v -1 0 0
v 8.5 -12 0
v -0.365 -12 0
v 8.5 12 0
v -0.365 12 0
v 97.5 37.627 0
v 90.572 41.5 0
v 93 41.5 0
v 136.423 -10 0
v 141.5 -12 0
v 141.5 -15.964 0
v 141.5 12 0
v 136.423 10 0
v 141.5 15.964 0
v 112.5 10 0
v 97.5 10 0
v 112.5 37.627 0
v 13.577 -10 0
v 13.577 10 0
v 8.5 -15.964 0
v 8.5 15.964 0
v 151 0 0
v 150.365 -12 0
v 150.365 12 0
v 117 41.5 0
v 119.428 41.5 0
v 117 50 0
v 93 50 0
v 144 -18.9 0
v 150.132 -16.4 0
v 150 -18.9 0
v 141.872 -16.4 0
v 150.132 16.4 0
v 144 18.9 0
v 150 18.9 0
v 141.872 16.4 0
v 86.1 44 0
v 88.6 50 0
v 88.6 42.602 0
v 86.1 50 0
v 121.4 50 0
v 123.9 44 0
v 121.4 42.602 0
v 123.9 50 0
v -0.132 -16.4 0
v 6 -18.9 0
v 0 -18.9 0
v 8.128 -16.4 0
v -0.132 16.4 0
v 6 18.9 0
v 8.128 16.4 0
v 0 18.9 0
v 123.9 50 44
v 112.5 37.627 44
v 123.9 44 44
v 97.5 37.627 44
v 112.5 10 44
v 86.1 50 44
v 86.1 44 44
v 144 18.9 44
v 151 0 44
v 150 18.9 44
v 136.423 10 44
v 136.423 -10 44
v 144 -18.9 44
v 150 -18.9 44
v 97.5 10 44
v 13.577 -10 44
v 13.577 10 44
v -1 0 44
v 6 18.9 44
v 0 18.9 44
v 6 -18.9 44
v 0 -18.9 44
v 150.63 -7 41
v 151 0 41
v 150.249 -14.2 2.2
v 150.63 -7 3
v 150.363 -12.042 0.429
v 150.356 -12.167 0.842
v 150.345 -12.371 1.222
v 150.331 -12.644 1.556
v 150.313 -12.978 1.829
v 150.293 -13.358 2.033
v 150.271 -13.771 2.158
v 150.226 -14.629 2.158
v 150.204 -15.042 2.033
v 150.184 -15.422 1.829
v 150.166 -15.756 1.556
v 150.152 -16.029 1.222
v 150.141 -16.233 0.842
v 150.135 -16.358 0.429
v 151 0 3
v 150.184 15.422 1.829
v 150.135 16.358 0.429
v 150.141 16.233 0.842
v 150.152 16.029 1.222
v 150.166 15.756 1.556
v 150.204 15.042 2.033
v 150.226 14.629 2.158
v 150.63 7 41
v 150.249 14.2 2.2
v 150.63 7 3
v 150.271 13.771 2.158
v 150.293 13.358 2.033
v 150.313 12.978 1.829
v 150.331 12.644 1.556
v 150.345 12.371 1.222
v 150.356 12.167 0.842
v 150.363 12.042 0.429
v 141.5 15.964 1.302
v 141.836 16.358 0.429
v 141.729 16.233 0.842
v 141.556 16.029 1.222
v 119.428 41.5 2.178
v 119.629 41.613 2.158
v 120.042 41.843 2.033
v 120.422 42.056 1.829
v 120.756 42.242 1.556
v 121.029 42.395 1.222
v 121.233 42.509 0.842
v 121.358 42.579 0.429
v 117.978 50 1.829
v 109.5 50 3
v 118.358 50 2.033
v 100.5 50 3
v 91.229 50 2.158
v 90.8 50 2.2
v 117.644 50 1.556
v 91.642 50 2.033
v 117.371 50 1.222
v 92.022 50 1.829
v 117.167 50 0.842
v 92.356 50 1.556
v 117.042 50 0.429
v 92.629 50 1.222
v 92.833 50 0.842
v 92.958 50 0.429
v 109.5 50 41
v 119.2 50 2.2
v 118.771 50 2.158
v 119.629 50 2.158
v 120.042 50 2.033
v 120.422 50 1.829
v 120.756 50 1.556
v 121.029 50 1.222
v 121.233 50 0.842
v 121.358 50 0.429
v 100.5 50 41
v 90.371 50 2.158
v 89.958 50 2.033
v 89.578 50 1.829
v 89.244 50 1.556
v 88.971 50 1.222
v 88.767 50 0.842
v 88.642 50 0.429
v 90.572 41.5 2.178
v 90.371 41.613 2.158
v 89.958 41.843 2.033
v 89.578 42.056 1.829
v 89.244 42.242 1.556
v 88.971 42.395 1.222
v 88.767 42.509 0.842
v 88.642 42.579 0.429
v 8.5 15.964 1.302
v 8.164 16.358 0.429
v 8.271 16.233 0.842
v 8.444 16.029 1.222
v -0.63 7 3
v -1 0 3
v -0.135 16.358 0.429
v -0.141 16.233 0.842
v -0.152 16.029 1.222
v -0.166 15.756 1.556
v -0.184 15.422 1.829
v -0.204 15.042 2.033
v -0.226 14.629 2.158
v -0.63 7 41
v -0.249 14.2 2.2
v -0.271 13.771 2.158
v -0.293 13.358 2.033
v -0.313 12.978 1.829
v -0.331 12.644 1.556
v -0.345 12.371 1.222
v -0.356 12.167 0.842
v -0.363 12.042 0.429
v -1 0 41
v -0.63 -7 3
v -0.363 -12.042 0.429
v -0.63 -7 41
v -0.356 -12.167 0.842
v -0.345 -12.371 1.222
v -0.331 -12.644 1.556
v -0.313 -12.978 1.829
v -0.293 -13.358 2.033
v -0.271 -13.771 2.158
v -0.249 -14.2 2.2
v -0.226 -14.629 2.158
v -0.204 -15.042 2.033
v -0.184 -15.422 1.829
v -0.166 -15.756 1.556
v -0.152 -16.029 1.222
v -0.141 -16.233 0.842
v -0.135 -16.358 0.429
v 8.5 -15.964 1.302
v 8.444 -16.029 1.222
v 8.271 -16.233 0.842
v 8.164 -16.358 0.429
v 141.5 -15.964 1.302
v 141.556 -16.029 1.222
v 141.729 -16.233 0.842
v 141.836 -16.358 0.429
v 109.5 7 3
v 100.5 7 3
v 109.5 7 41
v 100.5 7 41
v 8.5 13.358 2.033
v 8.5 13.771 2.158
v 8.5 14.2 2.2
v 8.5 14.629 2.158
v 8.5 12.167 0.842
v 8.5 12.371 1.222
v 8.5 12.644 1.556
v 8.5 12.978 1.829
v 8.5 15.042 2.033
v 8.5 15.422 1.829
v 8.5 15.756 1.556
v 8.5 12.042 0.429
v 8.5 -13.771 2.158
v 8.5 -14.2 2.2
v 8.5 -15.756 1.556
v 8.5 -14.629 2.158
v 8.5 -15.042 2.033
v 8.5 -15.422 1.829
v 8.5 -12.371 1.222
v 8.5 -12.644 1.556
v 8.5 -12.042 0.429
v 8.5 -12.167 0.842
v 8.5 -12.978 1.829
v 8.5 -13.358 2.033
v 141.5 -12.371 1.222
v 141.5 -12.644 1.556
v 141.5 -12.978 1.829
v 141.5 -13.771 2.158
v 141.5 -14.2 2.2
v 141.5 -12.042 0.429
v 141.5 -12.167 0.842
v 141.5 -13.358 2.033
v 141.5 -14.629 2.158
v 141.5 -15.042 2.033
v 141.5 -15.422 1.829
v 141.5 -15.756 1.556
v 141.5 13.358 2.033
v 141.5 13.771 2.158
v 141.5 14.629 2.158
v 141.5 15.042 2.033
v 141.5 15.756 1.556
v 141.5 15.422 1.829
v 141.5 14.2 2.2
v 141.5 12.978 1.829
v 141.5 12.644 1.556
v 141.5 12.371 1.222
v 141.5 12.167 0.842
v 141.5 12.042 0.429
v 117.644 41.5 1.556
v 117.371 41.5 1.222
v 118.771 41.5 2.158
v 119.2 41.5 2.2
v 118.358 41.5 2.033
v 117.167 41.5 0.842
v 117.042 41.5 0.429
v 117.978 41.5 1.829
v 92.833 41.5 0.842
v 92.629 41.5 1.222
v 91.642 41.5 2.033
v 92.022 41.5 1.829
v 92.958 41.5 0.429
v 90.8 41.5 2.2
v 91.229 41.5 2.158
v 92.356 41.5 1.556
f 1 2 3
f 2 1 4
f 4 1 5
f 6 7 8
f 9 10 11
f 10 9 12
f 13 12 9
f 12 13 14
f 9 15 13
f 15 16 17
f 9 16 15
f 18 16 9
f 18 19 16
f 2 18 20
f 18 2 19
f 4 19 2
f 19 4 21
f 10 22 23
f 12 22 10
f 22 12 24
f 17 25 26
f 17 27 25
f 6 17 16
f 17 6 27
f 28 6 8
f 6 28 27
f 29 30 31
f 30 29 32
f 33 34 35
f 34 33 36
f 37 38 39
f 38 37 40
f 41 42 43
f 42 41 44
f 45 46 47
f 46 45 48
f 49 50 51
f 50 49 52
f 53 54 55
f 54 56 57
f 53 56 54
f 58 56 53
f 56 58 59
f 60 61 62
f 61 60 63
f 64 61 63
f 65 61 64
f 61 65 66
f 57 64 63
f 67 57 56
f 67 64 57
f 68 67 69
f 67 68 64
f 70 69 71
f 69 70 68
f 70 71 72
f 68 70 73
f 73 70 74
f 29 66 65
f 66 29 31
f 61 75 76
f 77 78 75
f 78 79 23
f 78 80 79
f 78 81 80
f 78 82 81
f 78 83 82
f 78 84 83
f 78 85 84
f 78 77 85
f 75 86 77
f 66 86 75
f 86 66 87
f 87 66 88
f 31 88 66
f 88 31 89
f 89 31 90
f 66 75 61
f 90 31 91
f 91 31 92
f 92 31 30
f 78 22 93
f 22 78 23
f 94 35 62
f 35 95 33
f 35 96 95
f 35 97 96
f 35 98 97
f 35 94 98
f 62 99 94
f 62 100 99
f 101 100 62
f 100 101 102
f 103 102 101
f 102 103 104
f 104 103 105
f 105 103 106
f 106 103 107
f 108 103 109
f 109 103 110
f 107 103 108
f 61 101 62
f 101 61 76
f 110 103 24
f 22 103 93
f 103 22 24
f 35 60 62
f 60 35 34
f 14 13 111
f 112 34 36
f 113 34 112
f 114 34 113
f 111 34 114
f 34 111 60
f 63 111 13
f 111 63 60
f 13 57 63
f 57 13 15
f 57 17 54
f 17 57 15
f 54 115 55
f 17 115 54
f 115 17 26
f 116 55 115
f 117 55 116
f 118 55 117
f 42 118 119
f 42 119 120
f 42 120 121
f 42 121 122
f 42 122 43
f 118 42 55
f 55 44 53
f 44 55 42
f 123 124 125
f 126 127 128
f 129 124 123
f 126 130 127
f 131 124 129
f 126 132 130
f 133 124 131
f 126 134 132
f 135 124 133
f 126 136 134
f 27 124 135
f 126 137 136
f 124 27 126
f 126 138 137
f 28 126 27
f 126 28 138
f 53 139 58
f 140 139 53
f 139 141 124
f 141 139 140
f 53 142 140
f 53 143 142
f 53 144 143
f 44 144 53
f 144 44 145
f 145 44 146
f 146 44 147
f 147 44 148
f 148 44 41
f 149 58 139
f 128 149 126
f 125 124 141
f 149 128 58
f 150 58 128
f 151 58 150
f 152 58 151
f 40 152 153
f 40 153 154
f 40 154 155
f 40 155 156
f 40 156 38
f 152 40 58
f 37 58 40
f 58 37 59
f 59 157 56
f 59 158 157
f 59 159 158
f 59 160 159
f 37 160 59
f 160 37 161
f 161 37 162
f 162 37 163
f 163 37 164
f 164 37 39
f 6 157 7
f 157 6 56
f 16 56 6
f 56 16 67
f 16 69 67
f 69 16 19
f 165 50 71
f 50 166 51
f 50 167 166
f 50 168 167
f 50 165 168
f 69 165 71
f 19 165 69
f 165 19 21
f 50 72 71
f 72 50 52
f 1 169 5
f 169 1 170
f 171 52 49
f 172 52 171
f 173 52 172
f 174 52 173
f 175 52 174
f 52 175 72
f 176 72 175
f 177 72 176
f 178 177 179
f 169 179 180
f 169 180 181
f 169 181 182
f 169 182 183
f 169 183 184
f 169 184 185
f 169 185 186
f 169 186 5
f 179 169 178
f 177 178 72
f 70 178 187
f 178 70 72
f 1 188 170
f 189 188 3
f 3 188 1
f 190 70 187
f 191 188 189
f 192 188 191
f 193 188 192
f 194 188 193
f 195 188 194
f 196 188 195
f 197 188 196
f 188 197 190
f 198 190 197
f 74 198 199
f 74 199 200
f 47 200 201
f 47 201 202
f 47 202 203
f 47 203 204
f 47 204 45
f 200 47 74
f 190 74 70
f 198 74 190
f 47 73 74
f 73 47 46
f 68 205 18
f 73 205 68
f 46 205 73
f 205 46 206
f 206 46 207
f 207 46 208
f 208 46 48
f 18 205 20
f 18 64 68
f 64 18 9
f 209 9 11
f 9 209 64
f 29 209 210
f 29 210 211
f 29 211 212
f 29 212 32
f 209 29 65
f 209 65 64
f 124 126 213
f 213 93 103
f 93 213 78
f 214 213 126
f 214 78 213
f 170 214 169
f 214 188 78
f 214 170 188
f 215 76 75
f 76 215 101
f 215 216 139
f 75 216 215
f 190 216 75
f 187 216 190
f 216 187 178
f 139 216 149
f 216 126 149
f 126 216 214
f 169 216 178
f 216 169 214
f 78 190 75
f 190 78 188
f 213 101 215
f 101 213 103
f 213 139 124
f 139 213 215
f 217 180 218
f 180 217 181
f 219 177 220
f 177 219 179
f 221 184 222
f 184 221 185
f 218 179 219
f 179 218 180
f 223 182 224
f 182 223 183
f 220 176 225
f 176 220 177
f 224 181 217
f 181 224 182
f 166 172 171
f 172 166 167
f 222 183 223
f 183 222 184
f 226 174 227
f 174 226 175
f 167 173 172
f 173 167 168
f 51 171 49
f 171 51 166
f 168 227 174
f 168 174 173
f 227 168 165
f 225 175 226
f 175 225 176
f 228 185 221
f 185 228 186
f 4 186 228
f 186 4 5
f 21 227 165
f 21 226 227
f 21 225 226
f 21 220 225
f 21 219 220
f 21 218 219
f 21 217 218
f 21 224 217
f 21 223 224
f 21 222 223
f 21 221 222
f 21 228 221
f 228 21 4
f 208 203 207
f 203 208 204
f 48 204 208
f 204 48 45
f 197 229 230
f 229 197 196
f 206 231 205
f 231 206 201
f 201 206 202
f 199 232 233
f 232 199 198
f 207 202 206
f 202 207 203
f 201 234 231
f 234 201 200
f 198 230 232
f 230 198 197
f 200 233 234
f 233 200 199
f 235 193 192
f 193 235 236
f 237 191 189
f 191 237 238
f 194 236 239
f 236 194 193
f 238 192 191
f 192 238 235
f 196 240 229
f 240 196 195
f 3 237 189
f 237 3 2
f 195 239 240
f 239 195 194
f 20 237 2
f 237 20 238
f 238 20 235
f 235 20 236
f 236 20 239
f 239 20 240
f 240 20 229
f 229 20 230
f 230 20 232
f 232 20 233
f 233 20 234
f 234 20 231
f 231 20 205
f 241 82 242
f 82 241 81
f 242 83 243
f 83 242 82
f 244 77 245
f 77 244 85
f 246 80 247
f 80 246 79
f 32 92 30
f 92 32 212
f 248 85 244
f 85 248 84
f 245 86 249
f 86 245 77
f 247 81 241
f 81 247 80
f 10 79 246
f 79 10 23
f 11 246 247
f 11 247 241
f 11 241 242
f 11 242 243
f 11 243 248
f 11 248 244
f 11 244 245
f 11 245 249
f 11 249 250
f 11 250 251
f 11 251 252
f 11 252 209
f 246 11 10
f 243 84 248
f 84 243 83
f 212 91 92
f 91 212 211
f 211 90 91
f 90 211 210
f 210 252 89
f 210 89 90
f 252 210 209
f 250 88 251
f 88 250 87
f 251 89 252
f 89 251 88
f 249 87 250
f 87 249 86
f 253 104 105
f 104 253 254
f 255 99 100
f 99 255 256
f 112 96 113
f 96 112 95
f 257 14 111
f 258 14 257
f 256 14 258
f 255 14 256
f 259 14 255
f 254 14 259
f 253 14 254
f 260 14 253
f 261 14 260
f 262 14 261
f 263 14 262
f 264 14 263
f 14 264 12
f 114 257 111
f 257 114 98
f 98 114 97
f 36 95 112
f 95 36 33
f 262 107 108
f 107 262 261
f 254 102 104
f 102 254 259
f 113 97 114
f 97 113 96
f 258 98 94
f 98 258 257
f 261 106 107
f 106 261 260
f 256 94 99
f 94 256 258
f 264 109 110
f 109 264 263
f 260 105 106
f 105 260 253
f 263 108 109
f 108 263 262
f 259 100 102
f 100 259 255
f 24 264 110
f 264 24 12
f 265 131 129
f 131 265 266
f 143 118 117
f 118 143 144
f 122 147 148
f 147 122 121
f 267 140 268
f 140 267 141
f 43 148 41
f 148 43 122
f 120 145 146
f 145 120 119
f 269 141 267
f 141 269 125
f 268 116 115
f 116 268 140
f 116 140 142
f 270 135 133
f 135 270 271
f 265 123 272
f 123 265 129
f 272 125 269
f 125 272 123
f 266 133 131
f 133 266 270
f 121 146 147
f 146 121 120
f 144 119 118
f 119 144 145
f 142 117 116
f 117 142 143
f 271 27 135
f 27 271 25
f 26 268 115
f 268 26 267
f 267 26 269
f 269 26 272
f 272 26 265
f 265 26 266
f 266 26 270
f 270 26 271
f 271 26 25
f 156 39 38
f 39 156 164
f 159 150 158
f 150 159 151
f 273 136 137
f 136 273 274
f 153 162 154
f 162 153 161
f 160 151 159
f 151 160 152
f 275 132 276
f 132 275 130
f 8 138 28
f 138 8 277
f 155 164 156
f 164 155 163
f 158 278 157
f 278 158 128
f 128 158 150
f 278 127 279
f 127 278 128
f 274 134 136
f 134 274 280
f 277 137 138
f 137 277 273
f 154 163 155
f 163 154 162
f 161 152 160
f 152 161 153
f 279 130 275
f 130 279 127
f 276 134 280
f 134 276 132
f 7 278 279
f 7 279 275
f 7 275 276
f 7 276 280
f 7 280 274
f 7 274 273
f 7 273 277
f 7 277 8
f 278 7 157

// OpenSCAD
$fn = 32;

// ----------------------------------------------------------------------
// Air duct: 20 mm duct, 3 mm wall, 44 mm across
// ----------------------------------------------------------------------

// --- parameters (mm) ---
duct_r = 10;              // duct core radius
duct_d = 20;              // duct core diameter
wall = 3;                 // duct wall thickness
height = 44;              // duct width (extrusion height)
port_r = 18.9;            // port flange half width
port_d = 37.8;            // port flange width
port_t = 6;               // port flange thickness
bolt_d = 4.4;             // port bolt holes
bolt_offset = 14.2;       // bolt hole offset from the port axis
branch_r = 7.5;           // branch core radius
branch_d = 15;            // branch core diameter
branch_len = 50;          // branch length from the run axis

difference() {
  /* outer hull chain: tube with a flat flange plate at every port */
  linear_extrude(height = 44) {
    hull() {
      polygon([[0, -18.9], [0, 18.9], [6, 18.9], [6, -18.9]]);
      translate([9, 0]) circle(r = 10);
    }
    hull() {
      translate([9, 0]) circle(r = 10);
      translate([45, 0]) circle(r = 10);
    }
    hull() {
      translate([45, 0]) circle(r = 10);
      translate([105, 0]) circle(r = 10);
    }
    hull() {
      translate([105, 0]) circle(r = 10);
      translate([141, 0]) circle(r = 10);
    }
    hull() {
      translate([141, 0]) circle(r = 10);
      polygon([[150, 18.9], [150, -18.9], [144, -18.9], [144, 18.9]]);
    }
    hull() {
      translate([105, 0]) circle(r = 7.5);
      translate([105, 27.5]) circle(r = 7.5);
    }
    hull() {
      translate([105, 27.5]) circle(r = 7.5);
      translate([105, 42]) circle(r = 7.5);
    }
    hull() {
      translate([105, 42]) circle(r = 7.5);
      polygon([[86.1, 50], [123.9, 50], [123.9, 44], [86.1, 44]]);
    }
  }
  /* air passage: the same chain inset by the wall, 5 mm proud of the ports */
  translate([0, 0, 3]) linear_extrude(height = 38) {
    hull() {
      translate([-5, 0]) circle(r = 7);
      translate([45, 0]) circle(r = 7);
    }
    hull() {
      translate([45, 0]) circle(r = 7);
      translate([105, 0]) circle(r = 7);
    }
    hull() {
      translate([105, 0]) circle(r = 7);
      translate([155, 0]) circle(r = 7);
    }
    hull() {
      translate([105, 0]) circle(r = 4.5);
      translate([105, 27.5]) circle(r = 4.5);
    }
    hull() {
      translate([105, 27.5]) circle(r = 4.5);
      translate([105, 55]) circle(r = 4.5);
    }
  }
  translate([0, 0]) rotate([0, 0, -90]) translate([-14.2, -2.5]) rotate([-90, 0, 0]) cylinder(h = 11, d = 4.4);
  translate([0, 0]) rotate([0, 0, -90]) translate([14.2, -2.5]) rotate([-90, 0, 0]) cylinder(h = 11, d = 4.4);
  translate([150, 0]) rotate([0, 0, 90]) translate([-14.2, -2.5]) rotate([-90, 0, 0]) cylinder(h = 11, d = 4.4);
  translate([150, 0]) rotate([0, 0, 90]) translate([14.2, -2.5]) rotate([-90, 0, 0]) cylinder(h = 11, d = 4.4);
  translate([105, 50]) rotate([0, 0, 180]) translate([-14.2, -2.5]) rotate([-90, 0, 0]) cylinder(h = 11, d = 4.4);
  translate([105, 50]) rotate([0, 0, 180]) translate([14.2, -2.5]) rotate([-90, 0, 0]) cylinder(h = 11, d = 4.4);
}
